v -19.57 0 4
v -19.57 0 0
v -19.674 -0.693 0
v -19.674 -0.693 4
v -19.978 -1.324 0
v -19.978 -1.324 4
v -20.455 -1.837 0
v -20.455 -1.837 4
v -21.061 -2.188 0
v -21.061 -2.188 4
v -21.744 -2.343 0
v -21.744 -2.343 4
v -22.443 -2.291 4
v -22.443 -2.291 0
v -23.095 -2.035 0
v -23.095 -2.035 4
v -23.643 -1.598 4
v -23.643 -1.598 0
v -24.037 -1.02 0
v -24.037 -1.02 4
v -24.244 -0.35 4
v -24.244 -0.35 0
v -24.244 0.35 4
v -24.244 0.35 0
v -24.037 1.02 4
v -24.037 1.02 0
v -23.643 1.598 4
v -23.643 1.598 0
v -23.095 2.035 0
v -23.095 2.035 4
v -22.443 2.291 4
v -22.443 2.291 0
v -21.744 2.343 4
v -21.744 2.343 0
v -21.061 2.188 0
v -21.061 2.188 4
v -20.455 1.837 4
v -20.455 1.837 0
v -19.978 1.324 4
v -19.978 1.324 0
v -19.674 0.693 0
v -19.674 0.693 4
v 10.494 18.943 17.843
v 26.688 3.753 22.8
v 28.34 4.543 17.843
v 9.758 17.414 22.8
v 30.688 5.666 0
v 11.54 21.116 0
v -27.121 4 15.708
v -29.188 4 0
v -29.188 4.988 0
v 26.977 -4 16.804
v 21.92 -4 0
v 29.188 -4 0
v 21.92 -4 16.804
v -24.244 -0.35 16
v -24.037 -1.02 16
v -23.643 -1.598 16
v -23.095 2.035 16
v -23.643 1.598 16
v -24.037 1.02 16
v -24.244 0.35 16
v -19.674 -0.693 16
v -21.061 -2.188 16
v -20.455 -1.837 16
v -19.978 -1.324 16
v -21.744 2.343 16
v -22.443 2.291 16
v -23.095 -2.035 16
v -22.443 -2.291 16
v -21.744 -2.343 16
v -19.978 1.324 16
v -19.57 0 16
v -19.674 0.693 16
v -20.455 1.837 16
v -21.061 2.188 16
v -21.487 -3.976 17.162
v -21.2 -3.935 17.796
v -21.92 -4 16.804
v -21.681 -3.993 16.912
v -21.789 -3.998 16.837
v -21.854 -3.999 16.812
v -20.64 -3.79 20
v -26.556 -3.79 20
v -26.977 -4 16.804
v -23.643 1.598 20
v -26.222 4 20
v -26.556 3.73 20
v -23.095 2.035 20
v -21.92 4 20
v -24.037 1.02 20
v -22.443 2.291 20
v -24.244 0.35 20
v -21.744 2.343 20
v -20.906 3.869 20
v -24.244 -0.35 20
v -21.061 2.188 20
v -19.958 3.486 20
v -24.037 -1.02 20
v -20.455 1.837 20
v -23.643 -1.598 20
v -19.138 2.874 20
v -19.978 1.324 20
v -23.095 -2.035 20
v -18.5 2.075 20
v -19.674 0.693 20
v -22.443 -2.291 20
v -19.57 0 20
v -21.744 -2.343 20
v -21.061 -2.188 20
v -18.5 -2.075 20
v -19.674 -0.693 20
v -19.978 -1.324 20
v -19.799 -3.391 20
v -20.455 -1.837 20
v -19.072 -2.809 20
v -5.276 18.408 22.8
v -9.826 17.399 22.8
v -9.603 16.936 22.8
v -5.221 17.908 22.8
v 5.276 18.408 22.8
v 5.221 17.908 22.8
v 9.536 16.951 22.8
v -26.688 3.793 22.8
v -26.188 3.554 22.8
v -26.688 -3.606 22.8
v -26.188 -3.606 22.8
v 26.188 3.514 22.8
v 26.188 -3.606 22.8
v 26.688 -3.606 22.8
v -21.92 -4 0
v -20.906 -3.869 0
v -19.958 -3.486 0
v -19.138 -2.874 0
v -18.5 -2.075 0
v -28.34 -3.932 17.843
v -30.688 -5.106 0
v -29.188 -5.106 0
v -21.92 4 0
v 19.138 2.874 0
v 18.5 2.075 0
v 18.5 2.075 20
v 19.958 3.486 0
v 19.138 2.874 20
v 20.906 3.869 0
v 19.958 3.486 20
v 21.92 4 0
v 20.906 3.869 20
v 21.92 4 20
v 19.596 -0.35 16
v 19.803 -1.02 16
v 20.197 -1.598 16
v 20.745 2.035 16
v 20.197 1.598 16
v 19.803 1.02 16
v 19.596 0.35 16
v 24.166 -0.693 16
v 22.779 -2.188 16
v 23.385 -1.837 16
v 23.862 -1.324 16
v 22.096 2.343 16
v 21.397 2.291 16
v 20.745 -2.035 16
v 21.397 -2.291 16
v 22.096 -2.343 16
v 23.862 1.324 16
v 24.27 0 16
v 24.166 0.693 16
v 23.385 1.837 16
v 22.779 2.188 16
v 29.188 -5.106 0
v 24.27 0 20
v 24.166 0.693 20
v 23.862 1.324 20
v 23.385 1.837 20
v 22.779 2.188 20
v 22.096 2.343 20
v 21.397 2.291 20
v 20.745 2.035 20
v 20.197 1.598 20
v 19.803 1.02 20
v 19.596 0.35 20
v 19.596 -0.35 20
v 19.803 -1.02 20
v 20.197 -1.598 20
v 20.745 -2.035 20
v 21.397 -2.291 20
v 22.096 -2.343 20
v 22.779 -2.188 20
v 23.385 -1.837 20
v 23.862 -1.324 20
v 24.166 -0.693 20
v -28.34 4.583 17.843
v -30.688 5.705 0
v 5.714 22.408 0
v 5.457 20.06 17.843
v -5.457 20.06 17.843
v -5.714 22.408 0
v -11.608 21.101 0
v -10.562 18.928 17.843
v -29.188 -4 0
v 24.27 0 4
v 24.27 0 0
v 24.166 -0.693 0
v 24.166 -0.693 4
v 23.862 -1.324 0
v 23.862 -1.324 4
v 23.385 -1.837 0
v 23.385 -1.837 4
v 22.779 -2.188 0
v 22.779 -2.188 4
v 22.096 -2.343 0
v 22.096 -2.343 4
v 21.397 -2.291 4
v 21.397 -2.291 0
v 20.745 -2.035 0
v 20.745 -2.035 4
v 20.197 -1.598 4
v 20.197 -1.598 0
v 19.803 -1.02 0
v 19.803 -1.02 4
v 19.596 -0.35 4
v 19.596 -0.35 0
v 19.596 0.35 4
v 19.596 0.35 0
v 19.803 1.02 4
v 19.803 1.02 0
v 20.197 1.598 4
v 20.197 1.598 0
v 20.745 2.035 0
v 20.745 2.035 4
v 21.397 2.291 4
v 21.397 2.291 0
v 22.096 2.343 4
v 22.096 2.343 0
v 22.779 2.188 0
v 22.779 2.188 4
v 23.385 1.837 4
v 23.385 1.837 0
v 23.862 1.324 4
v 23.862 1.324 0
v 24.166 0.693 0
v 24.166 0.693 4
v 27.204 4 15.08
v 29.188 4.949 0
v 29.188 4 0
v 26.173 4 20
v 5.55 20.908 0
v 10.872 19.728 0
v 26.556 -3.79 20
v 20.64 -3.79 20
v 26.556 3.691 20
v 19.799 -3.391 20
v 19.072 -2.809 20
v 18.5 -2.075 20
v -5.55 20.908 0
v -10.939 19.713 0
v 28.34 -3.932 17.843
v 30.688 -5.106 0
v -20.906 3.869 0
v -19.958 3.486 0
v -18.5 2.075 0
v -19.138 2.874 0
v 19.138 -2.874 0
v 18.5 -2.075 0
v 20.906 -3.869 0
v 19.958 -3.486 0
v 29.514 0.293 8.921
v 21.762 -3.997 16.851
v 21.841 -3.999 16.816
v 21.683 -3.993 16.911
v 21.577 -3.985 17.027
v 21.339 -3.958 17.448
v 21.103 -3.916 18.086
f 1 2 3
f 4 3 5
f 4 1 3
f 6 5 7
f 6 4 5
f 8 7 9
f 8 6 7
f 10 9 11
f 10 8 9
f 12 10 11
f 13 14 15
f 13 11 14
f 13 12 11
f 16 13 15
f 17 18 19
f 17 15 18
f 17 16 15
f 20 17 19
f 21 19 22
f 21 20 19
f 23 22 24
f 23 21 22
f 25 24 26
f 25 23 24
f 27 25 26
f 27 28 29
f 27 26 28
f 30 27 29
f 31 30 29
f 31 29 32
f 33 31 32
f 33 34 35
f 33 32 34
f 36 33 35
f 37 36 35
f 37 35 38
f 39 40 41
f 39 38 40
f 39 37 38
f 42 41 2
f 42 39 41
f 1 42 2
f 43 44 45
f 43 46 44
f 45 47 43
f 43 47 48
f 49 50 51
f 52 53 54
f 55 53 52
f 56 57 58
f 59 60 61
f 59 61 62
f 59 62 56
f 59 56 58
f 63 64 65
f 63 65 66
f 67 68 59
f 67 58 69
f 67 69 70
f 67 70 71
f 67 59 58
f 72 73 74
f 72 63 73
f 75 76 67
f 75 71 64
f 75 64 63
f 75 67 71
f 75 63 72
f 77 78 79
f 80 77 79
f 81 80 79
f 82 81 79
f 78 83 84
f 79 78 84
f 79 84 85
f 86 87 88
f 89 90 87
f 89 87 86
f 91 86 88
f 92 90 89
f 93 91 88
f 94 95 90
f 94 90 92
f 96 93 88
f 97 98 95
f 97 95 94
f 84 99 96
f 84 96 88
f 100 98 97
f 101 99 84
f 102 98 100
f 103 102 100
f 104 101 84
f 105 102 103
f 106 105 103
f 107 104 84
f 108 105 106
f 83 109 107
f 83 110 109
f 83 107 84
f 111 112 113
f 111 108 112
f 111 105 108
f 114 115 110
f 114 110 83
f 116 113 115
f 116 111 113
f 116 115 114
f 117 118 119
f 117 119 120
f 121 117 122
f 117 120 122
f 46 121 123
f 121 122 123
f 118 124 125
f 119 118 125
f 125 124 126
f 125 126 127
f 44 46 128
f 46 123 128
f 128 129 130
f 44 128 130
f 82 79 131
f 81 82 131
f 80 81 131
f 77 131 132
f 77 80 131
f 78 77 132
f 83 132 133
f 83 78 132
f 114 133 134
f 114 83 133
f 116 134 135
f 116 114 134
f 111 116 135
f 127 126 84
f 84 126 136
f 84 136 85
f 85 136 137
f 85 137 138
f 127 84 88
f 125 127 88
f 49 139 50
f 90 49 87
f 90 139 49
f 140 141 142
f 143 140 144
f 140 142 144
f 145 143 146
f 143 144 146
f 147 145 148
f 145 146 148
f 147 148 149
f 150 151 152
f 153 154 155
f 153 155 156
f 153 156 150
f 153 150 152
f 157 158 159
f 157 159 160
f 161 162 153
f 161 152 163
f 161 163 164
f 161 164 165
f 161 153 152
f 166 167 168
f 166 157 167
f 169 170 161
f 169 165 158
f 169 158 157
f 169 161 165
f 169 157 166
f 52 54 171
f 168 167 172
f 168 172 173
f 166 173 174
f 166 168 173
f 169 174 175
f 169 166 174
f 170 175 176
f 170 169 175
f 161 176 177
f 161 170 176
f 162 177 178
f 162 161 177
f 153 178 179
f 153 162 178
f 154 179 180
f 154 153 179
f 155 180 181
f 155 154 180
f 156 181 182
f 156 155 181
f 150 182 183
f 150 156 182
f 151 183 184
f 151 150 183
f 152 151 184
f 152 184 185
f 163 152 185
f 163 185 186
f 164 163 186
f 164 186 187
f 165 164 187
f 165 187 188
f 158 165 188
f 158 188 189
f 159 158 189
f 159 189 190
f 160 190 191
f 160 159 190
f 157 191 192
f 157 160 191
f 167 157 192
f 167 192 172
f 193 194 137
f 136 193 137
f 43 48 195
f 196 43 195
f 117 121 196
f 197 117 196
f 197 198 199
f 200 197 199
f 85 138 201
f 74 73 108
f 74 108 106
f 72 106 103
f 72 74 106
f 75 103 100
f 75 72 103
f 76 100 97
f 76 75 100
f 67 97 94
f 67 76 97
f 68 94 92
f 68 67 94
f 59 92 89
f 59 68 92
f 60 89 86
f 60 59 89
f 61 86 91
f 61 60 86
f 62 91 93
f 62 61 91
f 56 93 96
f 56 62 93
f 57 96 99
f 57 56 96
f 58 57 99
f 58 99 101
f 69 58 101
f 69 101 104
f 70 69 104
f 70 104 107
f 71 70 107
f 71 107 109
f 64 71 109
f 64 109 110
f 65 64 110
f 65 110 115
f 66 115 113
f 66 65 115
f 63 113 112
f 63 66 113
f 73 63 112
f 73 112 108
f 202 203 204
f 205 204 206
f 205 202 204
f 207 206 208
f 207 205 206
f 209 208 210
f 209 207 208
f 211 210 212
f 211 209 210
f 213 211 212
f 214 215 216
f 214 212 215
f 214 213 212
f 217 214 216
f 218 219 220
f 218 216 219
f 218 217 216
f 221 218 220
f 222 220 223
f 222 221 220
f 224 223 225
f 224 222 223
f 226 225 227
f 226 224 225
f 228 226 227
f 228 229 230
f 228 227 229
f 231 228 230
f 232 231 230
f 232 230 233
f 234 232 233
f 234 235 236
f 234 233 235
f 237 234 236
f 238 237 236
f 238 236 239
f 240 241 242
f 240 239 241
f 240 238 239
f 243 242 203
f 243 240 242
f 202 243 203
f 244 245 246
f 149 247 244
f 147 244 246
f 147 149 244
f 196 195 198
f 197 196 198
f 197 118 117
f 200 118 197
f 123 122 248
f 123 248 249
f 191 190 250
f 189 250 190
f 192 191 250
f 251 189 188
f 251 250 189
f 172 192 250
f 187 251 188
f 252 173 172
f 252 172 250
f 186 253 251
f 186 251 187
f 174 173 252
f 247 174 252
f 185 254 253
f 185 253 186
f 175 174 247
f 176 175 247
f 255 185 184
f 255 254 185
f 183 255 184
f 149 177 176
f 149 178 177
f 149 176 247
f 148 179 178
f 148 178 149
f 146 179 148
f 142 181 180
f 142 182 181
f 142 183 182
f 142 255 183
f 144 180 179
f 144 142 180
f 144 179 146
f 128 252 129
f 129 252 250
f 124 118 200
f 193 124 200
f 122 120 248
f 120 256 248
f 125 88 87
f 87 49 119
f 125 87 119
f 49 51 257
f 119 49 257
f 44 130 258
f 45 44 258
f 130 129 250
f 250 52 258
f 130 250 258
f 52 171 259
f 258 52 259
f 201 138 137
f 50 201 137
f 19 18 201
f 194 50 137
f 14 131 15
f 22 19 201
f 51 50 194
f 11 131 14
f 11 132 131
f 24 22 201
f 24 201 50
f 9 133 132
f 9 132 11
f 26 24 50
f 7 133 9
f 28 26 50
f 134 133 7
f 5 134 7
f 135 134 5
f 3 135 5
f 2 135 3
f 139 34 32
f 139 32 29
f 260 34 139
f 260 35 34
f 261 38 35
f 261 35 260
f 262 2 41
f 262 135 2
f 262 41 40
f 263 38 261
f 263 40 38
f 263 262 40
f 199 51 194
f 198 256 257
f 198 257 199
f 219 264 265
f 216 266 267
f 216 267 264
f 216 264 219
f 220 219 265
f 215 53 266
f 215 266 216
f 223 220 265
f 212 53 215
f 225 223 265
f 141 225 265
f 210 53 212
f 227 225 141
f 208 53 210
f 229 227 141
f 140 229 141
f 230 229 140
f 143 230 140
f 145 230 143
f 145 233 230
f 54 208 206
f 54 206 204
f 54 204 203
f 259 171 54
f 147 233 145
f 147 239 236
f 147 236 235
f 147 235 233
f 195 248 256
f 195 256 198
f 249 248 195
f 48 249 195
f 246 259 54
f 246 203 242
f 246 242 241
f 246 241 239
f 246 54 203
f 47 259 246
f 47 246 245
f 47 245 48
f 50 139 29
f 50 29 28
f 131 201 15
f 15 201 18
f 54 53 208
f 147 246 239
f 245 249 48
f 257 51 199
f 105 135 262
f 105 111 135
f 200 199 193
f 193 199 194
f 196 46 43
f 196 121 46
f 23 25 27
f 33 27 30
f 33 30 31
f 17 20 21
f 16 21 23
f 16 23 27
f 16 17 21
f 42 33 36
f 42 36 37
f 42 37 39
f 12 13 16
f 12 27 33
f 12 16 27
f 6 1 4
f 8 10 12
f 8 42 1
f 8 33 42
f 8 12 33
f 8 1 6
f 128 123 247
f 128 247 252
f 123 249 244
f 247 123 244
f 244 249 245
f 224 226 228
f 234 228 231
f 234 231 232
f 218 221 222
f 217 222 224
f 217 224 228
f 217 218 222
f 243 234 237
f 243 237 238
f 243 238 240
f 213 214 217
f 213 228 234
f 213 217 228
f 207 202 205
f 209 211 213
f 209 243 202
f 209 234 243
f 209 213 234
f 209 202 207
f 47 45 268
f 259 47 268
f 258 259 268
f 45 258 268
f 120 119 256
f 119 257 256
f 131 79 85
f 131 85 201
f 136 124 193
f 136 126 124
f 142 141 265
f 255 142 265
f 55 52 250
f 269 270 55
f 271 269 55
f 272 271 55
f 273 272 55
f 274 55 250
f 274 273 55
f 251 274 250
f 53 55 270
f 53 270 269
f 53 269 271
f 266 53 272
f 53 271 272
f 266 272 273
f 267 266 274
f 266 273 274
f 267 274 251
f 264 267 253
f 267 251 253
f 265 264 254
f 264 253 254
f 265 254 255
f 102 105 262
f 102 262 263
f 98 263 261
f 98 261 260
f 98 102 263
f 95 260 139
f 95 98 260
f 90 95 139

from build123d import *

# Parameters (mm, degrees)
CHANFREIN1_SIZE              = 1
CHANFREIN1_SIZE2             = 5
BOSS_EXTRU_5_DEPTH           = 20
BOSS_EXTRU_5_2_DEPTH         = 20
ENL_V_MAT_EXTRU_2_DEPTH      = 62.559283201
ENL_V_MAT_EXTRU_2_DEPTH_BACK = 62.559283201
BOSS_EXTRU_6_REACH           = 63.559
BOSS_EXTRU_7_REACH           = 63.559
ENL_V_MAT_EXTRU_3_DEPTH      = 45.313661961
ENL_V_MAT_EXTRU_3_DEPTH_BACK = 45.313661961
ENL_V_MAT_EXTRU_4_DEPTH      = 45.313661961
ENL_V_MAT_EXTRU_4_DEPTH_BACK = 4
ESQUISSE16_R                 = 2.35
ENL_V_START                  = -4
ESQUISSE17_R                 = 2.35
ENL_V_MAT_EXTRU_5_DEPTH      = 4


with BuildPart() as part:
    # Esquisse2 → Lissage2 section 0
    with BuildSketch(Plane(origin=(0, 0, 22.8), x_dir=(-1, 0, 0), z_dir=(0, 0, -1))):
        with BuildLine():
            Line((9.60314516, 16.936366798), (5.221189916, 17.907863235))
            Line((5.221189916, 17.907863235), (-5.221189909, 17.907863235))
            Line((-5.221189909, 17.907863235), (-9.535571585, 16.951348119))
            Line((-9.535571585, 16.951348119), (-26.187917597, 3.514391472))
            Line((-26.187917597, 3.514391472), (-26.187917597, -3.605517616))
            Line((-26.187917597, -3.605517616), (-27.687917597, -3.605517616))
            Line((-27.687917597, -3.605517616), (-27.687917597, 4.231455295))
            Line((-27.687917597, 4.231455295), (-10.203724477, 18.339638298))
            Line((-10.203724477, 18.339638298), (-5.385473287, 19.407863235))
            Line((-5.385473287, 19.407863235), (5.385473294, 19.407863235))
            Line((5.385473294, 19.407863235), (10.271298051, 18.324656976))
            Line((10.271298051, 18.324656976), (27.687917597, 4.270999817))
            Line((27.687917597, 4.270999817), (27.687917597, -3.605517616))
            Line((27.687917597, -3.605517616), (26.187917597, -3.605517616))
            Line((26.187917597, -3.605517616), (26.187917597, 3.553935994))
            Line((26.187917597, 3.553935994), (9.60314516, 16.936366798))
        make_face()
    # Esquisse7 → Lissage2 section 1
    with BuildSketch(Plane.XY):
        with BuildLine():
            Line((30.687917597, -5.105517616), (30.687917597, 5.66558294))
            Line((30.687917597, 5.66558294), (11.54003026, 21.116218655))
            Line((11.54003026, 21.116218655), (5.714040045, 22.407863235))
            Line((5.714040045, 22.407863235), (-5.714040052, 22.407863235))
            Line((-5.714040052, 22.407863235), (-11.607603834, 21.101237334))
            Line((-11.607603834, 21.101237334), (-30.687917597, 5.705127462))
            Line((-30.687917597, 5.705127462), (-30.687917597, -5.105517616))
            Line((-30.687917597, -5.105517616), (-29.187917597, -5.105517616))
            Line((-29.187917597, -5.105517616), (-29.187917597, 4.988063639))
            Line((-29.187917597, 4.988063639), (-10.939450943, 19.712947155))
            Line((-10.939450943, 19.712947155), (-5.549756673, 20.907863235))
            Line((-5.549756673, 20.907863235), (5.549756666, 20.907863235))
            Line((5.549756666, 20.907863235), (10.871877368, 19.727928476))
            Line((10.871877368, 19.727928476), (29.187917597, 4.948519118))
            Line((29.187917597, 4.948519118), (29.187917597, -5.105517616))
            Line((29.187917597, -5.105517616), (30.687917597, -5.105517616))
        make_face()
    loft()

    # Chanfrein1
    chanfrein1_edges = [part.edges().sort_by_distance(p)[0] for p in [
        (-27.687917597, 0.3327411, 22.8),
        (-18.979607824, 11.297828397, 22.8),
        (-7.828385673, 18.866260106, 22.8),
        (-4e-09, 19.407863235, 22.8),
        (7.794598882, 18.873750766, 22.8),
        (18.945821037, 11.285546796, 22.8),
        (27.687917597, 0.312968839, 22.8),
    ]]
    chanfrein1_side = [part.faces().sort_by_distance(p)[0] for p in [
        (-7.541966061, 18.007574003, 22.8),
    ]]
    chamfer(chanfrein1_edges, length=CHANFREIN1_SIZE, length2=CHANFREIN1_SIZE2, reference=chanfrein1_side[0])

    # Esquisse12 → Boss.-Extru.6 (add, up to next)
    with BuildSketch(Plane(origin=(21.92, 0, 0), x_dir=(0, 0, -1), z_dir=(1, 0, 0)), mode=Mode.PRIVATE) as boss_extru_6_sk1:
        Polygon((-16.803867762, -4), (-20, -3.789728142), (-20, 4), (0, 4), (0, -4), align=None)
    boss_extru_6_tool1 = extrude(boss_extru_6_sk1.sketch, amount=BOSS_EXTRU_6_REACH, mode=Mode.PRIVATE) - part.part


with BuildPart() as body_2:
    # Esquisse8 → Boss.-Extru.5 (new body)
    with BuildSketch(Plane(origin=(0, 0, 20), x_dir=(-1, 0, 0), z_dir=(0, 0, -1))):
        with BuildLine():
            Line((-21.92, 4), (-21.92, -4))
            ThreePointArc((-21.92, -4), (-17.92, 0), (-21.92, 4))
        make_face()
    extrude(amount=BOSS_EXTRU_5_DEPTH)


with BuildPart() as body_3:
    # Esquisse8 → Boss.-Extru.5 2 (new body)
    with BuildSketch(Plane(origin=(0, 0, 20), x_dir=(-1, 0, 0), z_dir=(0, 0, -1))):
        with BuildLine():
            Line((21.92, 4), (21.92, -4))
            ThreePointArc((21.92, -4), (17.92, 0), (21.92, 4))
        make_face()
    extrude(amount=BOSS_EXTRU_5_2_DEPTH)


with BuildPart() as enl_v_mat_extru_2_tool:
    # Esquisse11 → Enlèv. mat.-Extru.2 (new, two sides: drawn at the far end of the back side and taken through both)
    with BuildSketch(Plane(origin=(21.92, 0, 0), x_dir=(0, 0, -1), z_dir=(1, 0, 0)).offset(-ENL_V_MAT_EXTRU_2_DEPTH_BACK)):
        Polygon((-20, -3.789728142), (-16.803867762, -4), (-20, -4), align=None)
    extrude(amount=ENL_V_MAT_EXTRU_2_DEPTH + ENL_V_MAT_EXTRU_2_DEPTH_BACK)


with BuildPart() as body_2_1:
    add(body_2.part)

    # Enlèv. mat.-Extru.2: cut by enl_v_mat_extru_2_tool
    add(enl_v_mat_extru_2_tool.part, mode=Mode.SUBTRACT)


with BuildPart() as body_3_1:
    add(body_3.part)

    # Enlèv. mat.-Extru.2: cut by enl_v_mat_extru_2_tool
    add(enl_v_mat_extru_2_tool.part, mode=Mode.SUBTRACT)


with BuildPart() as part_1:
    add(part.part)

    add(body_2_1.part)  # Boss.-Extru.6 merges body 2
    add(boss_extru_6_tool1.solids().sort_by_distance((21.92, 0.008271, 9.981196))[0])

    # Esquisse14 → Boss.-Extru.7 (add, up to next)
    with BuildSketch(Plane.ZY.offset(21.92), mode=Mode.PRIVATE) as boss_extru_7_sk1:
        Polygon((0, 4), (20, 4), (20, -3.789728142), (16.803867762, -4), (0, -4), align=None)
    boss_extru_7_tool1 = extrude(boss_extru_7_sk1.sketch, amount=BOSS_EXTRU_7_REACH, mode=Mode.PRIVATE) - part_1.part

    add(body_3_1.part)  # Boss.-Extru.7 merges body 3
    add(boss_extru_7_tool1.solids().sort_by_distance((-21.92, 0.008271, 9.981196))[0])

    # Esquisse15 → Enlèv. mat.-Extru.3 (cut, two sides: drawn at the far end of the back side and taken through both)
    with BuildSketch(Plane(origin=(0, 0, 0), x_dir=(-1, 0, 0), z_dir=(0, 0, -1)).offset(-ENL_V_MAT_EXTRU_3_DEPTH_BACK)):
        with BuildLine():
            ThreePointArc((-18.5, -2.074511991), (-17.92, 0), (-18.5, 2.074511991))
            Line((-18.5, 2.074511991), (-18.5, -2.074511991))
        make_face()
        with BuildLine():
            Line((18.5, -2.074511991), (18.5, 2.074511991))
            ThreePointArc((18.5, 2.074511991), (17.92, 0), (18.5, -2.074511991))
        make_face()
        with BuildLine():
            Line((18.5, 2.074511991), (18.5, 3.295393564))
            ThreePointArc((18.5, 3.295393564), (17.170682287, 0), (18.5, -3.295393564))
            Line((18.5, -3.295393564), (18.5, -2.074511991))
            ThreePointArc((18.5, -2.074511991), (17.92, 0), (18.5, 2.074511991))
        make_face()
    extrude(amount=ENL_V_MAT_EXTRU_3_DEPTH + ENL_V_MAT_EXTRU_3_DEPTH_BACK, mode=Mode.SUBTRACT)

    # Esquisse16 → Enlèv. mat.-Extru.4 (cut, two sides: drawn at the far end of the back side and taken through both)
    with BuildSketch(Plane(origin=(0, 0, 0), x_dir=(-1, 0, 0), z_dir=(0, 0, -1)).offset(-ENL_V_MAT_EXTRU_4_DEPTH_BACK)):
        with Locations(Location((-21.92, 0, 0), (0, 0, 180))):
            Circle(ESQUISSE16_R)
        with Locations(Location((21.92, 0, 0), (0, 0, 180))):
            Circle(ESQUISSE16_R)
    extrude(amount=ENL_V_MAT_EXTRU_4_DEPTH + ENL_V_MAT_EXTRU_4_DEPTH_BACK, mode=Mode.SUBTRACT)

    # Esquisse17 → Enlèv. mat.-Extru.5 (cut)
    with BuildSketch(Plane.XY.offset(20).offset(ENL_V_START)):
        with Locations((-21.92, 0)):
            Circle(ESQUISSE17_R)
        with Locations((21.92, 0)):
            Circle(ESQUISSE17_R)
    extrude(amount=ENL_V_MAT_EXTRU_5_DEPTH, mode=Mode.SUBTRACT)


solid = part_1.part
